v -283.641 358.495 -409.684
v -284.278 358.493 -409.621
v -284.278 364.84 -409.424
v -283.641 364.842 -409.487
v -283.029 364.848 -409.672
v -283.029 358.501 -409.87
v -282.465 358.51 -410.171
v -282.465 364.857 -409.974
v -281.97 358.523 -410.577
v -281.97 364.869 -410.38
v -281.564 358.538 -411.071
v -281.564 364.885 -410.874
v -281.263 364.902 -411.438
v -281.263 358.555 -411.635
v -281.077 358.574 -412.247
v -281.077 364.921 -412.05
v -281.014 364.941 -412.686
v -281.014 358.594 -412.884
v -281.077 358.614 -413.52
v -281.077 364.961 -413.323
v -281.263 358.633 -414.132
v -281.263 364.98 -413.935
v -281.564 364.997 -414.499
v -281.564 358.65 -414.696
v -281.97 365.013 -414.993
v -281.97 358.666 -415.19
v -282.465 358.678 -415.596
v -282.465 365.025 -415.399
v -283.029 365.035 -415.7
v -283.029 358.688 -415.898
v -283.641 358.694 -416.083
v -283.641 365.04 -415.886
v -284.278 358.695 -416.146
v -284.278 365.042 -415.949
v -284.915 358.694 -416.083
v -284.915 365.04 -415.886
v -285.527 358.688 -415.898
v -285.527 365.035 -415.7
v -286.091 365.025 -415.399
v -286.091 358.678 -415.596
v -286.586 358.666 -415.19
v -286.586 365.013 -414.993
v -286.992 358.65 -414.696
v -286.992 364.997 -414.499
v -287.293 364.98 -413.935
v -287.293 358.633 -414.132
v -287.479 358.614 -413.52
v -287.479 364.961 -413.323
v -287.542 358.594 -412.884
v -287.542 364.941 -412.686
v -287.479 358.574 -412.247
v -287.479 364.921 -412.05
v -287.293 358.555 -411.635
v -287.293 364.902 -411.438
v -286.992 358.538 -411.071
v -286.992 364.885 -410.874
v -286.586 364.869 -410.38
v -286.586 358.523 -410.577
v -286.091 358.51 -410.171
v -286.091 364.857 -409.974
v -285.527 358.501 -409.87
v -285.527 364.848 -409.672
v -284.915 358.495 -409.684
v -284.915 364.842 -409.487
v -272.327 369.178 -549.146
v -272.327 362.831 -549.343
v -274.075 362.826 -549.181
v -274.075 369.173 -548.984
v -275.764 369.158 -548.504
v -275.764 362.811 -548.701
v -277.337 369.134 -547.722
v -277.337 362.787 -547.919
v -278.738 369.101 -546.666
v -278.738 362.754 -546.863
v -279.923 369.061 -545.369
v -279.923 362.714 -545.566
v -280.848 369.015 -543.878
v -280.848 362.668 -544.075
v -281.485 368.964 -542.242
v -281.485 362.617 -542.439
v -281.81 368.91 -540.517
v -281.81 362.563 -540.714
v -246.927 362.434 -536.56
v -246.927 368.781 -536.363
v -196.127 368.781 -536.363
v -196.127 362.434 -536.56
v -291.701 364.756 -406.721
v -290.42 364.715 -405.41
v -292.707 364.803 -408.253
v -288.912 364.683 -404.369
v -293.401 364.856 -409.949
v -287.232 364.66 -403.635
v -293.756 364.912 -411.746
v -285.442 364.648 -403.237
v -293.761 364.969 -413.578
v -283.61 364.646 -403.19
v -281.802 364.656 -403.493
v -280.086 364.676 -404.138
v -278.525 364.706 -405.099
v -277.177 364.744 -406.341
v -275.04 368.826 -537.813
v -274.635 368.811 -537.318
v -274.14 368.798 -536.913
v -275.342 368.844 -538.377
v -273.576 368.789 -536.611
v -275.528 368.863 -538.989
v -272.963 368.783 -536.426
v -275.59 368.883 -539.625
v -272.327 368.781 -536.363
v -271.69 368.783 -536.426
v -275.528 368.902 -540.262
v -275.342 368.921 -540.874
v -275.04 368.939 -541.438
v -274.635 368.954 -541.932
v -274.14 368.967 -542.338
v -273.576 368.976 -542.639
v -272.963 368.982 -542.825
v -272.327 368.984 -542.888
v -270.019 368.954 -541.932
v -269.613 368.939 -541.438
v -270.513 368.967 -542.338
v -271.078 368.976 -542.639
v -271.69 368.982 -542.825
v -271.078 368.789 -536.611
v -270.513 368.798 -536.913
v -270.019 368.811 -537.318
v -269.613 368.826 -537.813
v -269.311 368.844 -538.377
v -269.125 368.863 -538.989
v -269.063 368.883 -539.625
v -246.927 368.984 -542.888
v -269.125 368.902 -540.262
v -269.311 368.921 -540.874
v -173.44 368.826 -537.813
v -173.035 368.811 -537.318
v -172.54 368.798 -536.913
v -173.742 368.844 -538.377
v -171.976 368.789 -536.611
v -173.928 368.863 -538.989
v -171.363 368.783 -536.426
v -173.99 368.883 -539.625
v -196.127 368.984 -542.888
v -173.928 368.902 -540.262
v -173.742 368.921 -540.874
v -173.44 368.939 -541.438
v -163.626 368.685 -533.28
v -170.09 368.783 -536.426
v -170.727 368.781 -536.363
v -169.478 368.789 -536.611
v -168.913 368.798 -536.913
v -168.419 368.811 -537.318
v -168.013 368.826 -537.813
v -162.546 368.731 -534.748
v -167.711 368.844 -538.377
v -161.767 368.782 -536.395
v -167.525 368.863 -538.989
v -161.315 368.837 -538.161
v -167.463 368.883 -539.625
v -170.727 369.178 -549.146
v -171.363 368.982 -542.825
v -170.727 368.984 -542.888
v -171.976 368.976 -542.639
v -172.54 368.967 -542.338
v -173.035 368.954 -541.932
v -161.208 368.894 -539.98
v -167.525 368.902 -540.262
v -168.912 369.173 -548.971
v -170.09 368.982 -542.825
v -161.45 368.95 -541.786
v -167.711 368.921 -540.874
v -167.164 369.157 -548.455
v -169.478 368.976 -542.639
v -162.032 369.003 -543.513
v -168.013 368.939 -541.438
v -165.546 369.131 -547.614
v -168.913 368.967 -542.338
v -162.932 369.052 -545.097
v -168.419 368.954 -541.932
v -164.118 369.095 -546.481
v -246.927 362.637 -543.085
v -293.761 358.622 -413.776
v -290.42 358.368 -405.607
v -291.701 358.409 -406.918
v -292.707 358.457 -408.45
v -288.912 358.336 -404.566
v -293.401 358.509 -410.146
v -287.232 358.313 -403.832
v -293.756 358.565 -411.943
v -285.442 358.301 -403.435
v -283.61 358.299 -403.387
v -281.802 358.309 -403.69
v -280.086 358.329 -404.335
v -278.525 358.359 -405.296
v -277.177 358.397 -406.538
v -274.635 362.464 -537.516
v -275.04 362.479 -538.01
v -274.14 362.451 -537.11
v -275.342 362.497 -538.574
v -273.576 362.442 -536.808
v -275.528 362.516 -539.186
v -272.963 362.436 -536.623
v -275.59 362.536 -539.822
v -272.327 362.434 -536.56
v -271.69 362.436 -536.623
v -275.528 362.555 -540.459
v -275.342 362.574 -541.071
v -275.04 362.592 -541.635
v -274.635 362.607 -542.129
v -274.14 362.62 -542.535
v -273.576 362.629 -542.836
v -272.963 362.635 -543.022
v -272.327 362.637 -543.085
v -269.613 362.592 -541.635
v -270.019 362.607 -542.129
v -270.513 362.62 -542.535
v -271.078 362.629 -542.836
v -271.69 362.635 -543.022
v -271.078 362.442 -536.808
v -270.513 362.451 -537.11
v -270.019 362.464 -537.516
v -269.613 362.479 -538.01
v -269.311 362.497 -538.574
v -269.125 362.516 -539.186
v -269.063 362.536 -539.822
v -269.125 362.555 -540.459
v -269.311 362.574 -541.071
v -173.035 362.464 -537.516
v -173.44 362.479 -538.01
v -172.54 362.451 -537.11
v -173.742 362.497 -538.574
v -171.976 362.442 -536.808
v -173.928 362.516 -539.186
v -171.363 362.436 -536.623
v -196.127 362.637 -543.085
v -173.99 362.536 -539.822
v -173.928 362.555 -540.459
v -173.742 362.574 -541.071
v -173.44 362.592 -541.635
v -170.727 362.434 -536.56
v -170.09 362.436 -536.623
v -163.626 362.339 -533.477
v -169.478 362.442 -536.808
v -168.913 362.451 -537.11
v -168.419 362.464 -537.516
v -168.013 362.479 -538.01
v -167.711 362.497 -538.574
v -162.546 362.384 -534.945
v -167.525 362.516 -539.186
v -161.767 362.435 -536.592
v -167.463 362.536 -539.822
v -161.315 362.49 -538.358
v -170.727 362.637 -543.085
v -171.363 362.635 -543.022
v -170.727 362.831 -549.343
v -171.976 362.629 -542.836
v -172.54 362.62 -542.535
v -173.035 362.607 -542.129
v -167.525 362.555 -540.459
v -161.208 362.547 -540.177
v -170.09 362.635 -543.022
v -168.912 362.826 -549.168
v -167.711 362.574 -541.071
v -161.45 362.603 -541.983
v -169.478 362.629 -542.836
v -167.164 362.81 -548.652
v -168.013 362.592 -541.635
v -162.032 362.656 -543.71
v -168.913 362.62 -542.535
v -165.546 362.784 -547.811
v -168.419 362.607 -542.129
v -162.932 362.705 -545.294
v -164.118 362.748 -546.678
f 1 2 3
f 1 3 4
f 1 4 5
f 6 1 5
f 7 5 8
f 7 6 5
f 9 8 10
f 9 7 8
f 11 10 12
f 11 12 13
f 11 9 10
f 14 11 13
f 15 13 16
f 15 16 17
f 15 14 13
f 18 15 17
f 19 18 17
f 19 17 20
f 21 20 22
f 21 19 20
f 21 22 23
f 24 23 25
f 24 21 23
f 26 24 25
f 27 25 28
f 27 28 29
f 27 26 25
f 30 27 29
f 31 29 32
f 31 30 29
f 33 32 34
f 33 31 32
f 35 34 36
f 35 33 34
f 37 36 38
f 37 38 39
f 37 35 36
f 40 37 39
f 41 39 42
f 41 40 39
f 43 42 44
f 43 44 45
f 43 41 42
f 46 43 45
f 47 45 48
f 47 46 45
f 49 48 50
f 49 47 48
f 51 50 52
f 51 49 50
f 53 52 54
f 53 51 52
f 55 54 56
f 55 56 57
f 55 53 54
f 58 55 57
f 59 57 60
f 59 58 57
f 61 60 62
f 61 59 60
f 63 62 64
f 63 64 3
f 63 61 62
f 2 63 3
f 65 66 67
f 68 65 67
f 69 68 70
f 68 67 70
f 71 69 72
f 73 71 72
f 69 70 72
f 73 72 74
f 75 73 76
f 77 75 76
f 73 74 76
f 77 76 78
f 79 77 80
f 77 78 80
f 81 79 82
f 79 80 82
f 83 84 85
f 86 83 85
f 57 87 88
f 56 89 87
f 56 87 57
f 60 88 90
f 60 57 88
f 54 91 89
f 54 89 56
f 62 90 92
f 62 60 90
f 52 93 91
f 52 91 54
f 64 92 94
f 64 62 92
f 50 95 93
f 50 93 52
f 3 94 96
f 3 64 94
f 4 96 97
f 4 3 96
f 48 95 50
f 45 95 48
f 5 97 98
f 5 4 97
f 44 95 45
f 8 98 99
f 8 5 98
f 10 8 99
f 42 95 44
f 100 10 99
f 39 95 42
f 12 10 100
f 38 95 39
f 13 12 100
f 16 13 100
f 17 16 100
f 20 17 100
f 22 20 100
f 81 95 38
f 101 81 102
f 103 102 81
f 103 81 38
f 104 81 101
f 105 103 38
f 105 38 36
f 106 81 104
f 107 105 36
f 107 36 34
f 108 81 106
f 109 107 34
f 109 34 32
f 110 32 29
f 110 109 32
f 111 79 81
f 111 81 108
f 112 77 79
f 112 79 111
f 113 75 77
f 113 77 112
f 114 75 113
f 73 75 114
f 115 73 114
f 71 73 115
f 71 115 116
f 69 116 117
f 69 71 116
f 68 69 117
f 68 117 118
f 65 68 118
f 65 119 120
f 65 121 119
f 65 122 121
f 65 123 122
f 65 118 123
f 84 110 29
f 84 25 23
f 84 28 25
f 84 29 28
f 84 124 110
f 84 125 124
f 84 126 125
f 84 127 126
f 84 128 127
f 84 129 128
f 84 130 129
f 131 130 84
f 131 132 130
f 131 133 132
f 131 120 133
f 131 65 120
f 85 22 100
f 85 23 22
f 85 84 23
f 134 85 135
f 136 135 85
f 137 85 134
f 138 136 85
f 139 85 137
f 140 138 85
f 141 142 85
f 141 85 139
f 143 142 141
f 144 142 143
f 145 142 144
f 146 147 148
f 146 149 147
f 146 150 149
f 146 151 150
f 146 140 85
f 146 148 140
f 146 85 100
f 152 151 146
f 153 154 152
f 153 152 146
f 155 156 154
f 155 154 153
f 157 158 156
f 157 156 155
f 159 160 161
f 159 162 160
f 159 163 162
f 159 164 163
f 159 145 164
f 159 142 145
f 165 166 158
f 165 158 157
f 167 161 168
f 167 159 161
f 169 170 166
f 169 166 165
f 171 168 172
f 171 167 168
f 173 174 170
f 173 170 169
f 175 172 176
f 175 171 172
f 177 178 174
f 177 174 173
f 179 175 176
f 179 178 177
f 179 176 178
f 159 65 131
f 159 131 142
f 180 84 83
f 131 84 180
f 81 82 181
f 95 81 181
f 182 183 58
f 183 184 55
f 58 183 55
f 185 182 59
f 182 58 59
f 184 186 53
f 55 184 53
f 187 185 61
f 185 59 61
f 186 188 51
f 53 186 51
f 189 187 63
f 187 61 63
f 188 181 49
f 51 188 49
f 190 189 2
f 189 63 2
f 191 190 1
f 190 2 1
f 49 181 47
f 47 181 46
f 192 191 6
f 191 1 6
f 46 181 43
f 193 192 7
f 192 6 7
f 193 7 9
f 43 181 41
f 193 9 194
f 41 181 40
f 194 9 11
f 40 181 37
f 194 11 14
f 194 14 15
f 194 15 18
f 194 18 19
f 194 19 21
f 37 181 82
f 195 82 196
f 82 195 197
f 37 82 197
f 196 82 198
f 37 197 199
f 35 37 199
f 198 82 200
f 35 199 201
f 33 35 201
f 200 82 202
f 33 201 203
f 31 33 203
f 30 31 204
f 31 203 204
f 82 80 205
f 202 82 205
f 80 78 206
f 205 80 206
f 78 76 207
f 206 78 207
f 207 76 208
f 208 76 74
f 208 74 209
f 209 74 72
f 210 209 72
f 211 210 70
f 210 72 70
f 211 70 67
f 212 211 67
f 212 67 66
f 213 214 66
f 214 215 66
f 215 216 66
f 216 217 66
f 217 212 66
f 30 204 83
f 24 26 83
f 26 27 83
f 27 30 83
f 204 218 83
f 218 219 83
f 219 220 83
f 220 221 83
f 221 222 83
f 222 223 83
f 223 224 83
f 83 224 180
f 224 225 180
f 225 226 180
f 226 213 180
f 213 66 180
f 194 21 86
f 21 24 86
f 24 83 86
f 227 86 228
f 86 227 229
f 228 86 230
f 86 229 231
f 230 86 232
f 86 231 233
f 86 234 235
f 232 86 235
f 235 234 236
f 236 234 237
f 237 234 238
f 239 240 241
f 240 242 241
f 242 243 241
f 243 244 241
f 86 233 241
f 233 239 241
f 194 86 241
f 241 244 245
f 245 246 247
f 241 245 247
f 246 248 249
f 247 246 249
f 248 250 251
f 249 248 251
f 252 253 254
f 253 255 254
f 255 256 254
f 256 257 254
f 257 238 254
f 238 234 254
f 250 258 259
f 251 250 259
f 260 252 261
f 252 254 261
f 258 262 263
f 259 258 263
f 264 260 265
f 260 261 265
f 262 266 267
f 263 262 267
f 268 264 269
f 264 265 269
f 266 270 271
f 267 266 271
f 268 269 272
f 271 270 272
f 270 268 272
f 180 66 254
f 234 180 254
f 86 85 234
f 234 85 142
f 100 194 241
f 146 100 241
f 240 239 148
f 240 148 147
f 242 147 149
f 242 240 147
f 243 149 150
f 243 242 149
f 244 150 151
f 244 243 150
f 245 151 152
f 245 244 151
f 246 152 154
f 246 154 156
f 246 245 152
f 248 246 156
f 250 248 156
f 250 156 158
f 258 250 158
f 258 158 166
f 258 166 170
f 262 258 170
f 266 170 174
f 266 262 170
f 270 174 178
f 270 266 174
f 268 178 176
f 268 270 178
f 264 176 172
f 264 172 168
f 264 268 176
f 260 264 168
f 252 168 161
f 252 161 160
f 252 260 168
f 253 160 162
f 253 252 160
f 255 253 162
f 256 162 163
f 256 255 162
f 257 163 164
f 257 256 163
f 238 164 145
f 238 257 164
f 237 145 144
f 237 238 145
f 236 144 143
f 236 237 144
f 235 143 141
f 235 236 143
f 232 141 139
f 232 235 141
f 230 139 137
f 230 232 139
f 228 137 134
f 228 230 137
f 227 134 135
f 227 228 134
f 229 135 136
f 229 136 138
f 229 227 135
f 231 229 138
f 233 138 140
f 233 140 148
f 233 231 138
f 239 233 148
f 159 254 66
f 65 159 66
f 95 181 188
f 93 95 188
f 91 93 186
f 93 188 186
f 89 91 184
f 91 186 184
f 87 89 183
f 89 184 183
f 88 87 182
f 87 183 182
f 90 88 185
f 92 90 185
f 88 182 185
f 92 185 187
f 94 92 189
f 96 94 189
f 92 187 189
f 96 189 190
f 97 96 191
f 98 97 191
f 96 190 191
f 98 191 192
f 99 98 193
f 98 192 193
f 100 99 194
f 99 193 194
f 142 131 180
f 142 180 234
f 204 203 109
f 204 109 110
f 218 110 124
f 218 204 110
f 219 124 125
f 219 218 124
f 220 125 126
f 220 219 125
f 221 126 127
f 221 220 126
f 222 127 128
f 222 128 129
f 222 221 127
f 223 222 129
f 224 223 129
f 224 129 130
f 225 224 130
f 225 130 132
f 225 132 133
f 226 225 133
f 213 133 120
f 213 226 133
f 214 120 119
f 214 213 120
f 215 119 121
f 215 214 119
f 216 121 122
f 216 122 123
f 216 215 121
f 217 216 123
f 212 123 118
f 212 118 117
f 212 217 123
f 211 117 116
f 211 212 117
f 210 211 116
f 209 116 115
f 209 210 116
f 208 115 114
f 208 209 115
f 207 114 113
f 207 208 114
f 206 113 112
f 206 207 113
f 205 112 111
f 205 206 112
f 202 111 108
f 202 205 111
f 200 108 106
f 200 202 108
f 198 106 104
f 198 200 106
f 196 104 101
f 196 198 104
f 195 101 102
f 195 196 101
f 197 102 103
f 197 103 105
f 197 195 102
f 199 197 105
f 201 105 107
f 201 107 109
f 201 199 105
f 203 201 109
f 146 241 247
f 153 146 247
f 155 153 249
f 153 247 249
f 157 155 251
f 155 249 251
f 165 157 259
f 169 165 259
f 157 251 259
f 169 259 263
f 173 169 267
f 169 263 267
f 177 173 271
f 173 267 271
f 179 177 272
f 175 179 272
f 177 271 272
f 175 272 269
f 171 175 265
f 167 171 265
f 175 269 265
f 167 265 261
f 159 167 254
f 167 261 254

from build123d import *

# Parameters (mm, degrees)
SKETCH1_R           = 3.2639
BOSS_EXTRUDE1_DEPTH = 6.35
SKETCH2_W           = 50.8
SKETCH2_H           = 6.5278
CUT_EXTRUDE1_DEPTH  = 633.86660682


with BuildPart() as part:
    # Sketch1 → Boss-Extrude1 (new body)
    with BuildSketch(Plane(origin=(0, 345.441352572, 10.725757471), x_dir=(1, 0, 0), z_dir=(0, 0.9995183146693659, 0.0310344750319807))):
        with BuildLine():
            Line((-170.726579561, 560.338454563), (-272.326579561, 560.338454563))
            ThreePointArc((-272.326579561, 560.338454563), (-278.738498836, 557.857098237), (-281.809681848, 551.705864791))
            Line((-281.809681848, 551.705864791), (-293.761055515, 424.705864791))
            ThreePointArc((-293.761055515, 424.705864791), (-288.089455083, 415.084303481), (-277.177301788, 417.464724444))
            Line((-277.177301788, 417.464724444), (-163.62592812, 544.464724444))
            ThreePointArc((-163.62592812, 544.464724444), (-162.031831739, 554.702797092), (-170.726579561, 560.338454563))
        make_face()
        with Locations(Location((-284.277953229, 423.813454563, 0), (0, 0, 270))):
            Circle(SKETCH1_R, mode=Mode.SUBTRACT)
        with Locations(Location((-272.326579561, 550.813454563, 0), (0, 0, 270))):
            Circle(SKETCH1_R, mode=Mode.SUBTRACT)
        with Locations(Location((-170.726579561, 550.813454563, 0), (0, 0, 270))):
            Circle(SKETCH1_R, mode=Mode.SUBTRACT)
    extrude(amount=BOSS_EXTRUDE1_DEPTH)

    # Sketch2 → Cut-Extrude1 (cut, through all)
    with BuildSketch(Plane(origin=(0, 351.78829387, 10.922826388), x_dir=(1, 0, 0), z_dir=(0, 0.9995183146693659, 0.03103447503198071))):
        with Locations((-221.526579561, 550.813454563)):
            Rectangle(SKETCH2_W, SKETCH2_H)
    extrude(amount=-CUT_EXTRUDE1_DEPTH, mode=Mode.SUBTRACT)


solid = part.part
